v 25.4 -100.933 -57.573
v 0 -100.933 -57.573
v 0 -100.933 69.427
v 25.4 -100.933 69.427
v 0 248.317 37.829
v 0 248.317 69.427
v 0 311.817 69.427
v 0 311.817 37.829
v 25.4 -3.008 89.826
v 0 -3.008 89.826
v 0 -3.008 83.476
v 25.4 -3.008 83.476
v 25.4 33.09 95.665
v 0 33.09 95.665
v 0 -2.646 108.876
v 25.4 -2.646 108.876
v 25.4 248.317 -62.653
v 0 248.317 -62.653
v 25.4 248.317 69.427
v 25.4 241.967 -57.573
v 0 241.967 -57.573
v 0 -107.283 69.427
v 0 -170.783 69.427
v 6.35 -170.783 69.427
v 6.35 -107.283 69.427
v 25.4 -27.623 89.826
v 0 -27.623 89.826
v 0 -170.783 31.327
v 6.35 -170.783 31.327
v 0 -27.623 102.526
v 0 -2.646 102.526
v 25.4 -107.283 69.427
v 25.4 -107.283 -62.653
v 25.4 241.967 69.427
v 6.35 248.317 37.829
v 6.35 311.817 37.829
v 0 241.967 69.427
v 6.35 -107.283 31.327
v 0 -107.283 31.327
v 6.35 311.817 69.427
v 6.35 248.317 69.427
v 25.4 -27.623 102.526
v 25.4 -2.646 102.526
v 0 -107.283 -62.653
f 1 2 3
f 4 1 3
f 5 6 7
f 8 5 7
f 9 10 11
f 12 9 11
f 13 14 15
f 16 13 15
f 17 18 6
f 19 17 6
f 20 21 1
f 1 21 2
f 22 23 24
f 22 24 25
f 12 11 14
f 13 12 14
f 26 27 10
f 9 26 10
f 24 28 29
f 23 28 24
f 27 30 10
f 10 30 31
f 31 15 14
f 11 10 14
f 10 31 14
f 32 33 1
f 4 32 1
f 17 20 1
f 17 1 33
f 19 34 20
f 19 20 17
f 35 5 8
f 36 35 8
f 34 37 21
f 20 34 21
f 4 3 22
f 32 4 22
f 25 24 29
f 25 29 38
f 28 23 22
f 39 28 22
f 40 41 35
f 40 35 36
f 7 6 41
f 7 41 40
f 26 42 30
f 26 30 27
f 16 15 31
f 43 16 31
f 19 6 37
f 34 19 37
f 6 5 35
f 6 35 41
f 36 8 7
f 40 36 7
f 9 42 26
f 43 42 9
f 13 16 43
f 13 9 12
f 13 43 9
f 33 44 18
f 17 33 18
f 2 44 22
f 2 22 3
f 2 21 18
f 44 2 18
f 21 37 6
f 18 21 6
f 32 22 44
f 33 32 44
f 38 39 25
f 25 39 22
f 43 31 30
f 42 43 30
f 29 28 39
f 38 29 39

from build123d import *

# Parameters (mm, degrees)
F1_DEPTH = 25.4
F0_W     = 63.5
F0_H     = 31.5976
F2_DEPTH = 6.35
F0_H_2   = 38.1
F3_DEPTH = 6.35
F4_DEPTH = 25.4


with BuildPart() as f1:
    # F0 (on Right) → F1 (new body)
    with BuildSketch(Plane.YZ):
        Polygon((241.967354, 69.426666), (241.967354, -57.573334), (248.317354, -57.573334), (248.317354, 37.829066), (248.317354, 69.426666), align=None)
        Polygon((-100.932646, -57.573334), (-107.282646, -57.573334), (-107.282646, -62.653334), (248.317354, -62.653334), (248.317354, -57.573334), (241.967354, -57.573334), align=None)
        Polygon((-107.282646, 31.326666), (-107.282646, -57.573334), (-100.932646, -57.573334), (-100.932646, 69.426666), (-107.282646, 69.426666), align=None)
    extrude(amount=F1_DEPTH)


with BuildPart() as f2:
    # F0 (on Right) → F2 (new body)
    with BuildSketch(Plane.YZ):
        with Locations((280.067354, 53.627866)):
            Rectangle(F0_W, F0_H)
    extrude(amount=F2_DEPTH)


with BuildPart() as f3:
    # F0 (on Right) → F3 (new body)
    with BuildSketch(Plane.YZ):
        with Locations((-139.032646, 50.376666)):
            Rectangle(F0_W, F0_H_2)
    extrude(amount=F3_DEPTH)


with BuildPart() as f4:
    # F0 (on Right) → F4 (new body)
    with BuildSketch(Plane.YZ):
        Polygon((33.090098, 95.664516), (-2.646084, 108.875696), (-2.646084, 102.525696), (-27.623326, 102.525696), (-27.623326, 89.825696), (-3.007585, 89.825696), (-3.007585, 83.475696), align=None)
    extrude(amount=F4_DEPTH)


solid = Compound([f1.part, f2.part, f3.part, f4.part])
